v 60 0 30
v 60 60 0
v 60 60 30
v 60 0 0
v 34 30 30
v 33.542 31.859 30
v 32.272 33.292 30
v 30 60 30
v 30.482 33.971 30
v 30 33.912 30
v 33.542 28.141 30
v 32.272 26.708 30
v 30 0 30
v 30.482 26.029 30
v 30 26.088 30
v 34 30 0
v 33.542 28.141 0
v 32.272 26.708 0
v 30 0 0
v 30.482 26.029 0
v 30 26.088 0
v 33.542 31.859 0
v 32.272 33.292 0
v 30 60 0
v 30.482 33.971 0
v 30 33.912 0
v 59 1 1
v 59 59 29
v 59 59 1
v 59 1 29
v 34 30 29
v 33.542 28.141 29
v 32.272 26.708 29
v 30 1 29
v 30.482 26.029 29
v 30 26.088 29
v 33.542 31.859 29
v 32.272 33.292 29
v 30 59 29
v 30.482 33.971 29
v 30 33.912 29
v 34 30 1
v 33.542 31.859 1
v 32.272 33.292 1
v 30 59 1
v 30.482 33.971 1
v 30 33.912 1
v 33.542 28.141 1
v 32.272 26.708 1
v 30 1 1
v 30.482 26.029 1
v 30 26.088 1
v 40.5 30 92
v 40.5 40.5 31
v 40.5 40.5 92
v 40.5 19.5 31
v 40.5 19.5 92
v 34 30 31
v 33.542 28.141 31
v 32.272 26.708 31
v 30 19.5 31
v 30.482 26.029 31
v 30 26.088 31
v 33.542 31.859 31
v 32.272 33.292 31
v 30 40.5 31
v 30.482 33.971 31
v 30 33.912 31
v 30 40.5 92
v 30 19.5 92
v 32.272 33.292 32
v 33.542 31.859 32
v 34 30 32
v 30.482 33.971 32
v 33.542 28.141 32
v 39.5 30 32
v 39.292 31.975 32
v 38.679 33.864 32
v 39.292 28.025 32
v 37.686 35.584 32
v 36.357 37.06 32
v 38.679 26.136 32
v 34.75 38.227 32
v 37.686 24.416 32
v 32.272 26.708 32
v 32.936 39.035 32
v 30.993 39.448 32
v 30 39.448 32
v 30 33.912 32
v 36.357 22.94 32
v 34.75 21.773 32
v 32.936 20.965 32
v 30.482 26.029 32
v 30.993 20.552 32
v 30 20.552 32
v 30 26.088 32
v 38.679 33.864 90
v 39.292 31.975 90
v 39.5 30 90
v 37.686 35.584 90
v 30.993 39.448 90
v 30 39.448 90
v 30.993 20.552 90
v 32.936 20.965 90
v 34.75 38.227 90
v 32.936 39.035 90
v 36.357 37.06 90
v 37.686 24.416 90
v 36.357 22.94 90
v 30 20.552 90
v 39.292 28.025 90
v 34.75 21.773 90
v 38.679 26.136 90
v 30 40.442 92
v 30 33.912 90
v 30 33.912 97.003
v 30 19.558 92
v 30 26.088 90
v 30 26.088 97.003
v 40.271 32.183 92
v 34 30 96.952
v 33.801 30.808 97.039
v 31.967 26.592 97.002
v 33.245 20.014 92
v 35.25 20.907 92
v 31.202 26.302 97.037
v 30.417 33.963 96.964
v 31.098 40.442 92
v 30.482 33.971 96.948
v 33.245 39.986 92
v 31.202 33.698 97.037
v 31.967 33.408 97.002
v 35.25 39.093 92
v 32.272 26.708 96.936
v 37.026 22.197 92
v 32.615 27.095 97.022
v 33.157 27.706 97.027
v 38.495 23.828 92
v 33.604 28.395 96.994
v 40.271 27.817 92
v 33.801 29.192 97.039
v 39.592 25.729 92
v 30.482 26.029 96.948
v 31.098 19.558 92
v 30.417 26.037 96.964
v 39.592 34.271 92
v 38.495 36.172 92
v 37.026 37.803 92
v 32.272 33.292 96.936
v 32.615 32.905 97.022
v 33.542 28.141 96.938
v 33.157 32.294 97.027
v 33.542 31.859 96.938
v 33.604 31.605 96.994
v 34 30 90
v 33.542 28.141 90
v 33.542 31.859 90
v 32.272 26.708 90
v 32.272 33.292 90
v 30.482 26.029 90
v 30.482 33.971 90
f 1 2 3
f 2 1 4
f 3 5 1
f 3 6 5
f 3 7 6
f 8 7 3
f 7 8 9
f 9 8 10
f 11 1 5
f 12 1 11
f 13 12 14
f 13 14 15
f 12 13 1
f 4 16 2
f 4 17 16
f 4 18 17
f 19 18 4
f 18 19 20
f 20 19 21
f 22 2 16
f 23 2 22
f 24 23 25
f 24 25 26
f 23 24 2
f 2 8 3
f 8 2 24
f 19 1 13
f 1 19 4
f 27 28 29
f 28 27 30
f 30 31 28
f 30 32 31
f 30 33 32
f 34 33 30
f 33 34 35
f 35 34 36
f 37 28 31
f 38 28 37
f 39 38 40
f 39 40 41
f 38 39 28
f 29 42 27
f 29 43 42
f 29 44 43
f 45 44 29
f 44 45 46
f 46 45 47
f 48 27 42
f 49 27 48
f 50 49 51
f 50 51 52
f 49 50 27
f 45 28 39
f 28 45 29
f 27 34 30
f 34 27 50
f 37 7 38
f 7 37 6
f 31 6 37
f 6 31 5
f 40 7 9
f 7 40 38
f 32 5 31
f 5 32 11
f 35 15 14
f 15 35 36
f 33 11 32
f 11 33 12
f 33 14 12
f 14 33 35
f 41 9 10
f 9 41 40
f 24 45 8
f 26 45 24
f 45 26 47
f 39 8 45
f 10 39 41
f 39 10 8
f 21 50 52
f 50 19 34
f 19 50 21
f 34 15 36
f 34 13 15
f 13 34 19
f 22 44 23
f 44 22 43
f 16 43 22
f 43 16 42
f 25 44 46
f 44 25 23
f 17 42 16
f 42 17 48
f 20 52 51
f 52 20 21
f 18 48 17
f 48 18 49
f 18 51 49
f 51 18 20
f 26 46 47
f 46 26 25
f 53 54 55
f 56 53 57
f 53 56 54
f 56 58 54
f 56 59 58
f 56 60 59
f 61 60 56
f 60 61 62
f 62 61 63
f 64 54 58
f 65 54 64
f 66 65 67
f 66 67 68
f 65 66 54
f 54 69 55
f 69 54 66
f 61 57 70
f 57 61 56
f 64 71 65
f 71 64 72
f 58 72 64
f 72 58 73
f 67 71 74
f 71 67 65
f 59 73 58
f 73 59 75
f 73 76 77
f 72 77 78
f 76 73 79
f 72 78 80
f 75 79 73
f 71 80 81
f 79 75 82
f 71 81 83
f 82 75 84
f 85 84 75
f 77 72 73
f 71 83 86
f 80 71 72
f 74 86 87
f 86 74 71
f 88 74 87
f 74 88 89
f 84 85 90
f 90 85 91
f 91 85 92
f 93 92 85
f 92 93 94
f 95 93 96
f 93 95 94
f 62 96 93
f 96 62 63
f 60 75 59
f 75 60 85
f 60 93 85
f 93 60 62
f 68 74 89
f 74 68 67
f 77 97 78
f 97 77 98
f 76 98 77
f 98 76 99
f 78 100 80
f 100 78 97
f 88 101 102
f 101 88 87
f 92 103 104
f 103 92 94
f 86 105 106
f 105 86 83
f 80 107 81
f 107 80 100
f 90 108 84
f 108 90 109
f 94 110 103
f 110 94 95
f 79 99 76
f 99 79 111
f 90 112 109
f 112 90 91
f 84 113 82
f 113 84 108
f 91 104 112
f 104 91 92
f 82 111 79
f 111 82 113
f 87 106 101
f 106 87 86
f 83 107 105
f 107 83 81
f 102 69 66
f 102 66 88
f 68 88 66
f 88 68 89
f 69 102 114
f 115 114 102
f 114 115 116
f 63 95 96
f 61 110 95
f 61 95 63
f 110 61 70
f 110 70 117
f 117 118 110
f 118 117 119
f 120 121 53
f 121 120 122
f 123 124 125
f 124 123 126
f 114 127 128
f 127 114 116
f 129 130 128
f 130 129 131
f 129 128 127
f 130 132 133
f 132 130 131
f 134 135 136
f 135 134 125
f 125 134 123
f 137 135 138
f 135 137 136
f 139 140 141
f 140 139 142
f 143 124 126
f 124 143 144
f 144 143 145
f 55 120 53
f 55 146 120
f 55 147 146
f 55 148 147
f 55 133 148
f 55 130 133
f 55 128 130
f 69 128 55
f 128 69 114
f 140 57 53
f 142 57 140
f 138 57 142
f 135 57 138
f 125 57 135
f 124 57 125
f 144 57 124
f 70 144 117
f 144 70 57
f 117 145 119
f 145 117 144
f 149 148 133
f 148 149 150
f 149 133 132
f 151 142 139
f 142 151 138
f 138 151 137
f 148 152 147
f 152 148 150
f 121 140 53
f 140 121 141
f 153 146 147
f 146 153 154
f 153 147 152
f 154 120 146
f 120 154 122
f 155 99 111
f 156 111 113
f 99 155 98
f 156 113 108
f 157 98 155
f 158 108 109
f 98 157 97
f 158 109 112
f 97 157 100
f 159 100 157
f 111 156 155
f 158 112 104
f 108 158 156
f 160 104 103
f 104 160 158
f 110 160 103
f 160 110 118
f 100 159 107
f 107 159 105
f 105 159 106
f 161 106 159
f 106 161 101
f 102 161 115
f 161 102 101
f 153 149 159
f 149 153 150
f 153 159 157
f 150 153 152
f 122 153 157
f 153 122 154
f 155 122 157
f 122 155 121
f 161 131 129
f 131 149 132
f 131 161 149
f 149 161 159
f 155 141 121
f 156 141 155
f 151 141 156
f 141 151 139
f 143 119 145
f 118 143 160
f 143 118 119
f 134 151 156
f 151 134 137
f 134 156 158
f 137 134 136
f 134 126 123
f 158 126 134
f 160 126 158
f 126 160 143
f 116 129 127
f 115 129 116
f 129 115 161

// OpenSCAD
// All units are in millimeters
bearing_outer_diameter = 19;
axle_diameter = 6+2; // M6 = 6mm
margin = 2; // How thick the walls should be
  
bottom_height = 30;
bottom_width = 60;

tube_width = bearing_outer_diameter + margin;
tube_height = 60;

module cap(width) {
    height = 2;
    cone_height = height * 4;
    difference() {
        union() {
            translate([width/2, width/2, height])
                cylinder(h=cone_height, r1=width/2, r2=0);
            cube([width, width, height]);
        }
        translate([width/2, width/2])
            cylinder(h=height*10, r1=axle_diameter/2, r2=axle_diameter/2);
        cube([width/2, width, cone_height]);
    }
}

module tube(height = 40, width=40) {
    difference() {
        cube([width, width, height]);
        //Bottom hole
        translate([width/2, width/2, 0])
            cylinder(h=1, r1=axle_diameter/2, r2=axle_diameter/2);
        
        //Upper hole
        translate([width/2, width/2, 1])
            cylinder(h=height, r1=bearing_outer_diameter/2, r2=bearing_outer_diameter/2);
        cube([width/2, width, height]);
    }
}



module bottom(height, width, wiring_hole_diameter=8) {
    difference() {
        cube([width, width, height]);
        translate([margin/2, margin/2, margin/2])
            cube([width-margin, width-margin, height-margin]);

        translate([width/2, width/2, height/2])
            cylinder(h=height, r1=axle_diameter/2, r2=axle_diameter/2);
        cube([width/2, width, height]);
        
        translate([width/2, width/2 , -height/2])
            cylinder(h=height, r1=wiring_hole_diameter/2, r2=wiring_hole_diameter/2);
    }
}

//Bottom
bottom(bottom_height, bottom_width);

//Tube
union() {
    //Tube
    translate([bottom_width/2-tube_width/2, bottom_width/2-tube_width/2, bottom_height+1])
        tube(tube_height, tube_width);
    //Cap
    translate([bottom_width/2-tube_width/2, bottom_width/2-tube_width/2, tube_height + bottom_height]) 
        cap(width=bearing_outer_diameter + margin);
}
